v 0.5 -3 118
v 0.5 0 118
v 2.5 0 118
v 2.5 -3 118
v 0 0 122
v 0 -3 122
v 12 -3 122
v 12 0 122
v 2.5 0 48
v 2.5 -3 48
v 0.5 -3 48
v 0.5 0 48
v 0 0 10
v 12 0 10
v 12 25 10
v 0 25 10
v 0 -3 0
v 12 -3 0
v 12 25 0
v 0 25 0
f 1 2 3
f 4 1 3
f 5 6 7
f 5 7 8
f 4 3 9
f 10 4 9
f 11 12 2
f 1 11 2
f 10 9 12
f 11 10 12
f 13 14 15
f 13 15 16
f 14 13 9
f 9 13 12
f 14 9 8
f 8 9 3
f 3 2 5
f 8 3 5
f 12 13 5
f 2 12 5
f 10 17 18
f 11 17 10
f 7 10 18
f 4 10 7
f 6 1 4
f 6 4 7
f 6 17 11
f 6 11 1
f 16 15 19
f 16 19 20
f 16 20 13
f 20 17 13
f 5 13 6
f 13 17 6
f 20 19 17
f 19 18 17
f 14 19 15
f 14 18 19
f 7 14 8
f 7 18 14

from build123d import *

# Parameters (mm, degrees)
F0_W     = 3
F0_H     = 122
F1_DEPTH = 12
F2_W     = 12
F2_H     = 10
F3_DEPTH = 25
F5_DEPTH = 3.001


with BuildPart() as f1:
    # F0 (on Right) → F1 (new body)
    with BuildSketch(Plane.YZ):
        with Locations((-1.5, 61)):
            Rectangle(F0_W, F0_H)
    extrude(amount=F1_DEPTH)

    # F2 (on face) → F3 (join)
    with BuildSketch(Plane(origin=(0, 0, 0), x_dir=(-1, 0, 0), z_dir=(0, 1, 0))):
        with Locations((-6, 5)):
            Rectangle(F2_W, F2_H)
    extrude(amount=F3_DEPTH)

    # F4 (on face) → F5 (cut, through all)
    with BuildSketch(Plane(origin=(0, 0, 0), x_dir=(-1, 0, 0), z_dir=(0, 1, 0))):
        Polygon((-0.5, 118), (-1.5, 118), (-2.5, 118), (-2.5, 48), (-1.5, 48), (-0.5, 48), align=None)
    extrude(amount=-F5_DEPTH, mode=Mode.SUBTRACT)


solid = f1.part
